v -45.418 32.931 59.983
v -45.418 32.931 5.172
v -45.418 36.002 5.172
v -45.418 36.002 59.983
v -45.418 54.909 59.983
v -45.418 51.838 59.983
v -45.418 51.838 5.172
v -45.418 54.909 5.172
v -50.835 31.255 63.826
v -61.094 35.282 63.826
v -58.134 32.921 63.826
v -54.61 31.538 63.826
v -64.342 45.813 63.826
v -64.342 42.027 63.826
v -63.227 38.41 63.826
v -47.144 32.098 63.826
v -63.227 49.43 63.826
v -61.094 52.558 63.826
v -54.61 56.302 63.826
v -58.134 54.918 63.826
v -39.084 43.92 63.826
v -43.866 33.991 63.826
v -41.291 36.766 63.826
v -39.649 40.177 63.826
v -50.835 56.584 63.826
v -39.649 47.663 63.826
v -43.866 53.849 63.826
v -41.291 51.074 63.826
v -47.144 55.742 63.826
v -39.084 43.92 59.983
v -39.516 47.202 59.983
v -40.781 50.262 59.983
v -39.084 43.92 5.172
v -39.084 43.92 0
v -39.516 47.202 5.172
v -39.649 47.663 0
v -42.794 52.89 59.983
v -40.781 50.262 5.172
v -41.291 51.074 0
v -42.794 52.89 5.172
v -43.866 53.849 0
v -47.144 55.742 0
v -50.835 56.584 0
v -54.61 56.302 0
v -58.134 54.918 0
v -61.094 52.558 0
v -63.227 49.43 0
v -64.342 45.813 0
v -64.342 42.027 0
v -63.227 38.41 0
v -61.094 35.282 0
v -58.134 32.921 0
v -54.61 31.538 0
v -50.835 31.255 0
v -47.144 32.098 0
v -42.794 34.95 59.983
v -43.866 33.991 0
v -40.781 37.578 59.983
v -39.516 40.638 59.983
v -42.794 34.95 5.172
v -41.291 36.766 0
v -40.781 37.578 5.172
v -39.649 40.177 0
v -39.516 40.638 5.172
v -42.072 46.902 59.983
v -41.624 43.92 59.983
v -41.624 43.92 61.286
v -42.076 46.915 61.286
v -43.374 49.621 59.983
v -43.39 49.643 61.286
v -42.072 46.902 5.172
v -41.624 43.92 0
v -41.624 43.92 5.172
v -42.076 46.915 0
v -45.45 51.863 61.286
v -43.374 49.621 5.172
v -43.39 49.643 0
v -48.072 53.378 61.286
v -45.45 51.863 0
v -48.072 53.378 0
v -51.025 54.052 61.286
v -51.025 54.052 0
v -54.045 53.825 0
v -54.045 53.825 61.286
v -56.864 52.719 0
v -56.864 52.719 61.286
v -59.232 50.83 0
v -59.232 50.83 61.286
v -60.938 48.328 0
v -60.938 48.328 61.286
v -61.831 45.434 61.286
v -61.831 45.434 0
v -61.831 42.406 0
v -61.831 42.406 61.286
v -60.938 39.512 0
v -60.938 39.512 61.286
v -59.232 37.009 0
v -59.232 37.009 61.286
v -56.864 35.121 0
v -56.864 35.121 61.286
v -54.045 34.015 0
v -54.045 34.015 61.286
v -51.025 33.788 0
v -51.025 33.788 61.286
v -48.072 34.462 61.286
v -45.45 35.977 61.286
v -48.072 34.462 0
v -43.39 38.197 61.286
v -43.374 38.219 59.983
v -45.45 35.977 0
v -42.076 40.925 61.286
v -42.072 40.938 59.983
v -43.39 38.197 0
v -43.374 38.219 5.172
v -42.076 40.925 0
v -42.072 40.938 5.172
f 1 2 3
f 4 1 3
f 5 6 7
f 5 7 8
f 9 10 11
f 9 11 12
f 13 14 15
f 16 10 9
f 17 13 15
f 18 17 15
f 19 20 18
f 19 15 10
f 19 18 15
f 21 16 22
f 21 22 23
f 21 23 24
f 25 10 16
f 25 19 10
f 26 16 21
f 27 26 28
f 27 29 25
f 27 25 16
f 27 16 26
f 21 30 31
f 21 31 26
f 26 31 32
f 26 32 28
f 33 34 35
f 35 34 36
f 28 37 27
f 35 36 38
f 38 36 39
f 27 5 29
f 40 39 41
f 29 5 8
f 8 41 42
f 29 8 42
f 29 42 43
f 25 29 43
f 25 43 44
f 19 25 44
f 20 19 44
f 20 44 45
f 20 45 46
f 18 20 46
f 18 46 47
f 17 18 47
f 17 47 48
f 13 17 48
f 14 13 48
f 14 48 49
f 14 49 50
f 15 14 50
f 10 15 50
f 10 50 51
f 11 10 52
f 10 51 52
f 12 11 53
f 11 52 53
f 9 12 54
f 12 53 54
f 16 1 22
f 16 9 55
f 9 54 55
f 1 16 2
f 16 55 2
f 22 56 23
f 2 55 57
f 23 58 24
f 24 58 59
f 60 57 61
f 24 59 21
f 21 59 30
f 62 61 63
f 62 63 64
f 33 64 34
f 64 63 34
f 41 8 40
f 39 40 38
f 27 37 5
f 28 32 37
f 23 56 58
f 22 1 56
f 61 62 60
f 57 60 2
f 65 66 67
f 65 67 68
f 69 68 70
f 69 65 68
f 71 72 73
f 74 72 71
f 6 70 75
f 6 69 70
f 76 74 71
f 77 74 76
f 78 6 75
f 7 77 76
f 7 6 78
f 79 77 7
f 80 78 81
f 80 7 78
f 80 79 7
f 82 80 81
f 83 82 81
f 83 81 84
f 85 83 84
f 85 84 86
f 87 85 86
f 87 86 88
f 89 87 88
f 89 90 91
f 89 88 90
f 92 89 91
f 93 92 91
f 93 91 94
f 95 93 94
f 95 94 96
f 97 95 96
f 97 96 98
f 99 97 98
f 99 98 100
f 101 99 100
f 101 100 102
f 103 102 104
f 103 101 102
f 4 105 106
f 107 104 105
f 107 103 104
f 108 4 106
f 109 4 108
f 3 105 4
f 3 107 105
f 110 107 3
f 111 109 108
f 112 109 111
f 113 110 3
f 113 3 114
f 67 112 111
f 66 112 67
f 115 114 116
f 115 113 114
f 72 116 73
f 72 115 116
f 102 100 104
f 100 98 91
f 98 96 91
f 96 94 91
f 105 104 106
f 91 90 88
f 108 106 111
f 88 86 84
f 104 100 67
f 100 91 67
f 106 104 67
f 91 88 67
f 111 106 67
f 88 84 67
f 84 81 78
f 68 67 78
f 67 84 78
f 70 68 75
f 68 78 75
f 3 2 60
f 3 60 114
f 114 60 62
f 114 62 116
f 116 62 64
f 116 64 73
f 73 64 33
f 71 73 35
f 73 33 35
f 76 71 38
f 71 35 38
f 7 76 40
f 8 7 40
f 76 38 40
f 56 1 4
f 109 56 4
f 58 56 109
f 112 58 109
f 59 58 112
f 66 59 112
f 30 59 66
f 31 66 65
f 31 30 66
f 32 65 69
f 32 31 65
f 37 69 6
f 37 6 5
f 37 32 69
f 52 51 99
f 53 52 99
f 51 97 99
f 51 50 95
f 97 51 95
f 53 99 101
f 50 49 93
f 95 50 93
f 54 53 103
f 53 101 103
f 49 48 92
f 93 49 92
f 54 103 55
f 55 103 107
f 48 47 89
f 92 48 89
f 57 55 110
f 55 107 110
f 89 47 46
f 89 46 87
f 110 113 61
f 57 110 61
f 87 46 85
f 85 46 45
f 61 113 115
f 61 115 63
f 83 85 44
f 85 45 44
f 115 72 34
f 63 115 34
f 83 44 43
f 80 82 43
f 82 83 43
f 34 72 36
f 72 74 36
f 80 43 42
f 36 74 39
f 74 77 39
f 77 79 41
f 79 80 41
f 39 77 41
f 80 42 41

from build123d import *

# Parameters (mm, degrees)
F0_R     = 12.7
F1_DEPTH = 63.82626
F3_T     = -2.54
F4_W     = 43.020739
F4_H     = 54.811081
F5_DEPTH = 45.41777
F2_W     = 40.954981
F2_H     = 44.655449
F6_DEPTH = 29.8618


with BuildPart() as f1:
    # F0 (on Top) → F1 (new body)
    with BuildSketch(Plane.XY):
        with Locations((-51.784314, 43.91994)):
            Circle(F0_R)
    extrude(amount=F1_DEPTH)

    # F3
    f3_openings = [f1.faces().sort_by_distance(p)[0] for p in [
        (-51.784314, 43.91994, 0),
    ]]
    offset(amount=F3_T, openings=f3_openings)

    # F4 (on Right) → F5 (cut)
    with BuildSketch(Plane.YZ):
        with Locations((47.886142, 32.577515)):
            Rectangle(F4_W, F4_H)
    extrude(amount=-F5_DEPTH, mode=Mode.SUBTRACT)

    # F2 (on Front) → F6 (cut)
    with BuildSketch(Plane.XZ):
        with Locations((-53.447423, 32.679513)):
            Rectangle(F2_W, F2_H)
    extrude(amount=-F6_DEPTH, mode=Mode.SUBTRACT)


solid = f1.part
